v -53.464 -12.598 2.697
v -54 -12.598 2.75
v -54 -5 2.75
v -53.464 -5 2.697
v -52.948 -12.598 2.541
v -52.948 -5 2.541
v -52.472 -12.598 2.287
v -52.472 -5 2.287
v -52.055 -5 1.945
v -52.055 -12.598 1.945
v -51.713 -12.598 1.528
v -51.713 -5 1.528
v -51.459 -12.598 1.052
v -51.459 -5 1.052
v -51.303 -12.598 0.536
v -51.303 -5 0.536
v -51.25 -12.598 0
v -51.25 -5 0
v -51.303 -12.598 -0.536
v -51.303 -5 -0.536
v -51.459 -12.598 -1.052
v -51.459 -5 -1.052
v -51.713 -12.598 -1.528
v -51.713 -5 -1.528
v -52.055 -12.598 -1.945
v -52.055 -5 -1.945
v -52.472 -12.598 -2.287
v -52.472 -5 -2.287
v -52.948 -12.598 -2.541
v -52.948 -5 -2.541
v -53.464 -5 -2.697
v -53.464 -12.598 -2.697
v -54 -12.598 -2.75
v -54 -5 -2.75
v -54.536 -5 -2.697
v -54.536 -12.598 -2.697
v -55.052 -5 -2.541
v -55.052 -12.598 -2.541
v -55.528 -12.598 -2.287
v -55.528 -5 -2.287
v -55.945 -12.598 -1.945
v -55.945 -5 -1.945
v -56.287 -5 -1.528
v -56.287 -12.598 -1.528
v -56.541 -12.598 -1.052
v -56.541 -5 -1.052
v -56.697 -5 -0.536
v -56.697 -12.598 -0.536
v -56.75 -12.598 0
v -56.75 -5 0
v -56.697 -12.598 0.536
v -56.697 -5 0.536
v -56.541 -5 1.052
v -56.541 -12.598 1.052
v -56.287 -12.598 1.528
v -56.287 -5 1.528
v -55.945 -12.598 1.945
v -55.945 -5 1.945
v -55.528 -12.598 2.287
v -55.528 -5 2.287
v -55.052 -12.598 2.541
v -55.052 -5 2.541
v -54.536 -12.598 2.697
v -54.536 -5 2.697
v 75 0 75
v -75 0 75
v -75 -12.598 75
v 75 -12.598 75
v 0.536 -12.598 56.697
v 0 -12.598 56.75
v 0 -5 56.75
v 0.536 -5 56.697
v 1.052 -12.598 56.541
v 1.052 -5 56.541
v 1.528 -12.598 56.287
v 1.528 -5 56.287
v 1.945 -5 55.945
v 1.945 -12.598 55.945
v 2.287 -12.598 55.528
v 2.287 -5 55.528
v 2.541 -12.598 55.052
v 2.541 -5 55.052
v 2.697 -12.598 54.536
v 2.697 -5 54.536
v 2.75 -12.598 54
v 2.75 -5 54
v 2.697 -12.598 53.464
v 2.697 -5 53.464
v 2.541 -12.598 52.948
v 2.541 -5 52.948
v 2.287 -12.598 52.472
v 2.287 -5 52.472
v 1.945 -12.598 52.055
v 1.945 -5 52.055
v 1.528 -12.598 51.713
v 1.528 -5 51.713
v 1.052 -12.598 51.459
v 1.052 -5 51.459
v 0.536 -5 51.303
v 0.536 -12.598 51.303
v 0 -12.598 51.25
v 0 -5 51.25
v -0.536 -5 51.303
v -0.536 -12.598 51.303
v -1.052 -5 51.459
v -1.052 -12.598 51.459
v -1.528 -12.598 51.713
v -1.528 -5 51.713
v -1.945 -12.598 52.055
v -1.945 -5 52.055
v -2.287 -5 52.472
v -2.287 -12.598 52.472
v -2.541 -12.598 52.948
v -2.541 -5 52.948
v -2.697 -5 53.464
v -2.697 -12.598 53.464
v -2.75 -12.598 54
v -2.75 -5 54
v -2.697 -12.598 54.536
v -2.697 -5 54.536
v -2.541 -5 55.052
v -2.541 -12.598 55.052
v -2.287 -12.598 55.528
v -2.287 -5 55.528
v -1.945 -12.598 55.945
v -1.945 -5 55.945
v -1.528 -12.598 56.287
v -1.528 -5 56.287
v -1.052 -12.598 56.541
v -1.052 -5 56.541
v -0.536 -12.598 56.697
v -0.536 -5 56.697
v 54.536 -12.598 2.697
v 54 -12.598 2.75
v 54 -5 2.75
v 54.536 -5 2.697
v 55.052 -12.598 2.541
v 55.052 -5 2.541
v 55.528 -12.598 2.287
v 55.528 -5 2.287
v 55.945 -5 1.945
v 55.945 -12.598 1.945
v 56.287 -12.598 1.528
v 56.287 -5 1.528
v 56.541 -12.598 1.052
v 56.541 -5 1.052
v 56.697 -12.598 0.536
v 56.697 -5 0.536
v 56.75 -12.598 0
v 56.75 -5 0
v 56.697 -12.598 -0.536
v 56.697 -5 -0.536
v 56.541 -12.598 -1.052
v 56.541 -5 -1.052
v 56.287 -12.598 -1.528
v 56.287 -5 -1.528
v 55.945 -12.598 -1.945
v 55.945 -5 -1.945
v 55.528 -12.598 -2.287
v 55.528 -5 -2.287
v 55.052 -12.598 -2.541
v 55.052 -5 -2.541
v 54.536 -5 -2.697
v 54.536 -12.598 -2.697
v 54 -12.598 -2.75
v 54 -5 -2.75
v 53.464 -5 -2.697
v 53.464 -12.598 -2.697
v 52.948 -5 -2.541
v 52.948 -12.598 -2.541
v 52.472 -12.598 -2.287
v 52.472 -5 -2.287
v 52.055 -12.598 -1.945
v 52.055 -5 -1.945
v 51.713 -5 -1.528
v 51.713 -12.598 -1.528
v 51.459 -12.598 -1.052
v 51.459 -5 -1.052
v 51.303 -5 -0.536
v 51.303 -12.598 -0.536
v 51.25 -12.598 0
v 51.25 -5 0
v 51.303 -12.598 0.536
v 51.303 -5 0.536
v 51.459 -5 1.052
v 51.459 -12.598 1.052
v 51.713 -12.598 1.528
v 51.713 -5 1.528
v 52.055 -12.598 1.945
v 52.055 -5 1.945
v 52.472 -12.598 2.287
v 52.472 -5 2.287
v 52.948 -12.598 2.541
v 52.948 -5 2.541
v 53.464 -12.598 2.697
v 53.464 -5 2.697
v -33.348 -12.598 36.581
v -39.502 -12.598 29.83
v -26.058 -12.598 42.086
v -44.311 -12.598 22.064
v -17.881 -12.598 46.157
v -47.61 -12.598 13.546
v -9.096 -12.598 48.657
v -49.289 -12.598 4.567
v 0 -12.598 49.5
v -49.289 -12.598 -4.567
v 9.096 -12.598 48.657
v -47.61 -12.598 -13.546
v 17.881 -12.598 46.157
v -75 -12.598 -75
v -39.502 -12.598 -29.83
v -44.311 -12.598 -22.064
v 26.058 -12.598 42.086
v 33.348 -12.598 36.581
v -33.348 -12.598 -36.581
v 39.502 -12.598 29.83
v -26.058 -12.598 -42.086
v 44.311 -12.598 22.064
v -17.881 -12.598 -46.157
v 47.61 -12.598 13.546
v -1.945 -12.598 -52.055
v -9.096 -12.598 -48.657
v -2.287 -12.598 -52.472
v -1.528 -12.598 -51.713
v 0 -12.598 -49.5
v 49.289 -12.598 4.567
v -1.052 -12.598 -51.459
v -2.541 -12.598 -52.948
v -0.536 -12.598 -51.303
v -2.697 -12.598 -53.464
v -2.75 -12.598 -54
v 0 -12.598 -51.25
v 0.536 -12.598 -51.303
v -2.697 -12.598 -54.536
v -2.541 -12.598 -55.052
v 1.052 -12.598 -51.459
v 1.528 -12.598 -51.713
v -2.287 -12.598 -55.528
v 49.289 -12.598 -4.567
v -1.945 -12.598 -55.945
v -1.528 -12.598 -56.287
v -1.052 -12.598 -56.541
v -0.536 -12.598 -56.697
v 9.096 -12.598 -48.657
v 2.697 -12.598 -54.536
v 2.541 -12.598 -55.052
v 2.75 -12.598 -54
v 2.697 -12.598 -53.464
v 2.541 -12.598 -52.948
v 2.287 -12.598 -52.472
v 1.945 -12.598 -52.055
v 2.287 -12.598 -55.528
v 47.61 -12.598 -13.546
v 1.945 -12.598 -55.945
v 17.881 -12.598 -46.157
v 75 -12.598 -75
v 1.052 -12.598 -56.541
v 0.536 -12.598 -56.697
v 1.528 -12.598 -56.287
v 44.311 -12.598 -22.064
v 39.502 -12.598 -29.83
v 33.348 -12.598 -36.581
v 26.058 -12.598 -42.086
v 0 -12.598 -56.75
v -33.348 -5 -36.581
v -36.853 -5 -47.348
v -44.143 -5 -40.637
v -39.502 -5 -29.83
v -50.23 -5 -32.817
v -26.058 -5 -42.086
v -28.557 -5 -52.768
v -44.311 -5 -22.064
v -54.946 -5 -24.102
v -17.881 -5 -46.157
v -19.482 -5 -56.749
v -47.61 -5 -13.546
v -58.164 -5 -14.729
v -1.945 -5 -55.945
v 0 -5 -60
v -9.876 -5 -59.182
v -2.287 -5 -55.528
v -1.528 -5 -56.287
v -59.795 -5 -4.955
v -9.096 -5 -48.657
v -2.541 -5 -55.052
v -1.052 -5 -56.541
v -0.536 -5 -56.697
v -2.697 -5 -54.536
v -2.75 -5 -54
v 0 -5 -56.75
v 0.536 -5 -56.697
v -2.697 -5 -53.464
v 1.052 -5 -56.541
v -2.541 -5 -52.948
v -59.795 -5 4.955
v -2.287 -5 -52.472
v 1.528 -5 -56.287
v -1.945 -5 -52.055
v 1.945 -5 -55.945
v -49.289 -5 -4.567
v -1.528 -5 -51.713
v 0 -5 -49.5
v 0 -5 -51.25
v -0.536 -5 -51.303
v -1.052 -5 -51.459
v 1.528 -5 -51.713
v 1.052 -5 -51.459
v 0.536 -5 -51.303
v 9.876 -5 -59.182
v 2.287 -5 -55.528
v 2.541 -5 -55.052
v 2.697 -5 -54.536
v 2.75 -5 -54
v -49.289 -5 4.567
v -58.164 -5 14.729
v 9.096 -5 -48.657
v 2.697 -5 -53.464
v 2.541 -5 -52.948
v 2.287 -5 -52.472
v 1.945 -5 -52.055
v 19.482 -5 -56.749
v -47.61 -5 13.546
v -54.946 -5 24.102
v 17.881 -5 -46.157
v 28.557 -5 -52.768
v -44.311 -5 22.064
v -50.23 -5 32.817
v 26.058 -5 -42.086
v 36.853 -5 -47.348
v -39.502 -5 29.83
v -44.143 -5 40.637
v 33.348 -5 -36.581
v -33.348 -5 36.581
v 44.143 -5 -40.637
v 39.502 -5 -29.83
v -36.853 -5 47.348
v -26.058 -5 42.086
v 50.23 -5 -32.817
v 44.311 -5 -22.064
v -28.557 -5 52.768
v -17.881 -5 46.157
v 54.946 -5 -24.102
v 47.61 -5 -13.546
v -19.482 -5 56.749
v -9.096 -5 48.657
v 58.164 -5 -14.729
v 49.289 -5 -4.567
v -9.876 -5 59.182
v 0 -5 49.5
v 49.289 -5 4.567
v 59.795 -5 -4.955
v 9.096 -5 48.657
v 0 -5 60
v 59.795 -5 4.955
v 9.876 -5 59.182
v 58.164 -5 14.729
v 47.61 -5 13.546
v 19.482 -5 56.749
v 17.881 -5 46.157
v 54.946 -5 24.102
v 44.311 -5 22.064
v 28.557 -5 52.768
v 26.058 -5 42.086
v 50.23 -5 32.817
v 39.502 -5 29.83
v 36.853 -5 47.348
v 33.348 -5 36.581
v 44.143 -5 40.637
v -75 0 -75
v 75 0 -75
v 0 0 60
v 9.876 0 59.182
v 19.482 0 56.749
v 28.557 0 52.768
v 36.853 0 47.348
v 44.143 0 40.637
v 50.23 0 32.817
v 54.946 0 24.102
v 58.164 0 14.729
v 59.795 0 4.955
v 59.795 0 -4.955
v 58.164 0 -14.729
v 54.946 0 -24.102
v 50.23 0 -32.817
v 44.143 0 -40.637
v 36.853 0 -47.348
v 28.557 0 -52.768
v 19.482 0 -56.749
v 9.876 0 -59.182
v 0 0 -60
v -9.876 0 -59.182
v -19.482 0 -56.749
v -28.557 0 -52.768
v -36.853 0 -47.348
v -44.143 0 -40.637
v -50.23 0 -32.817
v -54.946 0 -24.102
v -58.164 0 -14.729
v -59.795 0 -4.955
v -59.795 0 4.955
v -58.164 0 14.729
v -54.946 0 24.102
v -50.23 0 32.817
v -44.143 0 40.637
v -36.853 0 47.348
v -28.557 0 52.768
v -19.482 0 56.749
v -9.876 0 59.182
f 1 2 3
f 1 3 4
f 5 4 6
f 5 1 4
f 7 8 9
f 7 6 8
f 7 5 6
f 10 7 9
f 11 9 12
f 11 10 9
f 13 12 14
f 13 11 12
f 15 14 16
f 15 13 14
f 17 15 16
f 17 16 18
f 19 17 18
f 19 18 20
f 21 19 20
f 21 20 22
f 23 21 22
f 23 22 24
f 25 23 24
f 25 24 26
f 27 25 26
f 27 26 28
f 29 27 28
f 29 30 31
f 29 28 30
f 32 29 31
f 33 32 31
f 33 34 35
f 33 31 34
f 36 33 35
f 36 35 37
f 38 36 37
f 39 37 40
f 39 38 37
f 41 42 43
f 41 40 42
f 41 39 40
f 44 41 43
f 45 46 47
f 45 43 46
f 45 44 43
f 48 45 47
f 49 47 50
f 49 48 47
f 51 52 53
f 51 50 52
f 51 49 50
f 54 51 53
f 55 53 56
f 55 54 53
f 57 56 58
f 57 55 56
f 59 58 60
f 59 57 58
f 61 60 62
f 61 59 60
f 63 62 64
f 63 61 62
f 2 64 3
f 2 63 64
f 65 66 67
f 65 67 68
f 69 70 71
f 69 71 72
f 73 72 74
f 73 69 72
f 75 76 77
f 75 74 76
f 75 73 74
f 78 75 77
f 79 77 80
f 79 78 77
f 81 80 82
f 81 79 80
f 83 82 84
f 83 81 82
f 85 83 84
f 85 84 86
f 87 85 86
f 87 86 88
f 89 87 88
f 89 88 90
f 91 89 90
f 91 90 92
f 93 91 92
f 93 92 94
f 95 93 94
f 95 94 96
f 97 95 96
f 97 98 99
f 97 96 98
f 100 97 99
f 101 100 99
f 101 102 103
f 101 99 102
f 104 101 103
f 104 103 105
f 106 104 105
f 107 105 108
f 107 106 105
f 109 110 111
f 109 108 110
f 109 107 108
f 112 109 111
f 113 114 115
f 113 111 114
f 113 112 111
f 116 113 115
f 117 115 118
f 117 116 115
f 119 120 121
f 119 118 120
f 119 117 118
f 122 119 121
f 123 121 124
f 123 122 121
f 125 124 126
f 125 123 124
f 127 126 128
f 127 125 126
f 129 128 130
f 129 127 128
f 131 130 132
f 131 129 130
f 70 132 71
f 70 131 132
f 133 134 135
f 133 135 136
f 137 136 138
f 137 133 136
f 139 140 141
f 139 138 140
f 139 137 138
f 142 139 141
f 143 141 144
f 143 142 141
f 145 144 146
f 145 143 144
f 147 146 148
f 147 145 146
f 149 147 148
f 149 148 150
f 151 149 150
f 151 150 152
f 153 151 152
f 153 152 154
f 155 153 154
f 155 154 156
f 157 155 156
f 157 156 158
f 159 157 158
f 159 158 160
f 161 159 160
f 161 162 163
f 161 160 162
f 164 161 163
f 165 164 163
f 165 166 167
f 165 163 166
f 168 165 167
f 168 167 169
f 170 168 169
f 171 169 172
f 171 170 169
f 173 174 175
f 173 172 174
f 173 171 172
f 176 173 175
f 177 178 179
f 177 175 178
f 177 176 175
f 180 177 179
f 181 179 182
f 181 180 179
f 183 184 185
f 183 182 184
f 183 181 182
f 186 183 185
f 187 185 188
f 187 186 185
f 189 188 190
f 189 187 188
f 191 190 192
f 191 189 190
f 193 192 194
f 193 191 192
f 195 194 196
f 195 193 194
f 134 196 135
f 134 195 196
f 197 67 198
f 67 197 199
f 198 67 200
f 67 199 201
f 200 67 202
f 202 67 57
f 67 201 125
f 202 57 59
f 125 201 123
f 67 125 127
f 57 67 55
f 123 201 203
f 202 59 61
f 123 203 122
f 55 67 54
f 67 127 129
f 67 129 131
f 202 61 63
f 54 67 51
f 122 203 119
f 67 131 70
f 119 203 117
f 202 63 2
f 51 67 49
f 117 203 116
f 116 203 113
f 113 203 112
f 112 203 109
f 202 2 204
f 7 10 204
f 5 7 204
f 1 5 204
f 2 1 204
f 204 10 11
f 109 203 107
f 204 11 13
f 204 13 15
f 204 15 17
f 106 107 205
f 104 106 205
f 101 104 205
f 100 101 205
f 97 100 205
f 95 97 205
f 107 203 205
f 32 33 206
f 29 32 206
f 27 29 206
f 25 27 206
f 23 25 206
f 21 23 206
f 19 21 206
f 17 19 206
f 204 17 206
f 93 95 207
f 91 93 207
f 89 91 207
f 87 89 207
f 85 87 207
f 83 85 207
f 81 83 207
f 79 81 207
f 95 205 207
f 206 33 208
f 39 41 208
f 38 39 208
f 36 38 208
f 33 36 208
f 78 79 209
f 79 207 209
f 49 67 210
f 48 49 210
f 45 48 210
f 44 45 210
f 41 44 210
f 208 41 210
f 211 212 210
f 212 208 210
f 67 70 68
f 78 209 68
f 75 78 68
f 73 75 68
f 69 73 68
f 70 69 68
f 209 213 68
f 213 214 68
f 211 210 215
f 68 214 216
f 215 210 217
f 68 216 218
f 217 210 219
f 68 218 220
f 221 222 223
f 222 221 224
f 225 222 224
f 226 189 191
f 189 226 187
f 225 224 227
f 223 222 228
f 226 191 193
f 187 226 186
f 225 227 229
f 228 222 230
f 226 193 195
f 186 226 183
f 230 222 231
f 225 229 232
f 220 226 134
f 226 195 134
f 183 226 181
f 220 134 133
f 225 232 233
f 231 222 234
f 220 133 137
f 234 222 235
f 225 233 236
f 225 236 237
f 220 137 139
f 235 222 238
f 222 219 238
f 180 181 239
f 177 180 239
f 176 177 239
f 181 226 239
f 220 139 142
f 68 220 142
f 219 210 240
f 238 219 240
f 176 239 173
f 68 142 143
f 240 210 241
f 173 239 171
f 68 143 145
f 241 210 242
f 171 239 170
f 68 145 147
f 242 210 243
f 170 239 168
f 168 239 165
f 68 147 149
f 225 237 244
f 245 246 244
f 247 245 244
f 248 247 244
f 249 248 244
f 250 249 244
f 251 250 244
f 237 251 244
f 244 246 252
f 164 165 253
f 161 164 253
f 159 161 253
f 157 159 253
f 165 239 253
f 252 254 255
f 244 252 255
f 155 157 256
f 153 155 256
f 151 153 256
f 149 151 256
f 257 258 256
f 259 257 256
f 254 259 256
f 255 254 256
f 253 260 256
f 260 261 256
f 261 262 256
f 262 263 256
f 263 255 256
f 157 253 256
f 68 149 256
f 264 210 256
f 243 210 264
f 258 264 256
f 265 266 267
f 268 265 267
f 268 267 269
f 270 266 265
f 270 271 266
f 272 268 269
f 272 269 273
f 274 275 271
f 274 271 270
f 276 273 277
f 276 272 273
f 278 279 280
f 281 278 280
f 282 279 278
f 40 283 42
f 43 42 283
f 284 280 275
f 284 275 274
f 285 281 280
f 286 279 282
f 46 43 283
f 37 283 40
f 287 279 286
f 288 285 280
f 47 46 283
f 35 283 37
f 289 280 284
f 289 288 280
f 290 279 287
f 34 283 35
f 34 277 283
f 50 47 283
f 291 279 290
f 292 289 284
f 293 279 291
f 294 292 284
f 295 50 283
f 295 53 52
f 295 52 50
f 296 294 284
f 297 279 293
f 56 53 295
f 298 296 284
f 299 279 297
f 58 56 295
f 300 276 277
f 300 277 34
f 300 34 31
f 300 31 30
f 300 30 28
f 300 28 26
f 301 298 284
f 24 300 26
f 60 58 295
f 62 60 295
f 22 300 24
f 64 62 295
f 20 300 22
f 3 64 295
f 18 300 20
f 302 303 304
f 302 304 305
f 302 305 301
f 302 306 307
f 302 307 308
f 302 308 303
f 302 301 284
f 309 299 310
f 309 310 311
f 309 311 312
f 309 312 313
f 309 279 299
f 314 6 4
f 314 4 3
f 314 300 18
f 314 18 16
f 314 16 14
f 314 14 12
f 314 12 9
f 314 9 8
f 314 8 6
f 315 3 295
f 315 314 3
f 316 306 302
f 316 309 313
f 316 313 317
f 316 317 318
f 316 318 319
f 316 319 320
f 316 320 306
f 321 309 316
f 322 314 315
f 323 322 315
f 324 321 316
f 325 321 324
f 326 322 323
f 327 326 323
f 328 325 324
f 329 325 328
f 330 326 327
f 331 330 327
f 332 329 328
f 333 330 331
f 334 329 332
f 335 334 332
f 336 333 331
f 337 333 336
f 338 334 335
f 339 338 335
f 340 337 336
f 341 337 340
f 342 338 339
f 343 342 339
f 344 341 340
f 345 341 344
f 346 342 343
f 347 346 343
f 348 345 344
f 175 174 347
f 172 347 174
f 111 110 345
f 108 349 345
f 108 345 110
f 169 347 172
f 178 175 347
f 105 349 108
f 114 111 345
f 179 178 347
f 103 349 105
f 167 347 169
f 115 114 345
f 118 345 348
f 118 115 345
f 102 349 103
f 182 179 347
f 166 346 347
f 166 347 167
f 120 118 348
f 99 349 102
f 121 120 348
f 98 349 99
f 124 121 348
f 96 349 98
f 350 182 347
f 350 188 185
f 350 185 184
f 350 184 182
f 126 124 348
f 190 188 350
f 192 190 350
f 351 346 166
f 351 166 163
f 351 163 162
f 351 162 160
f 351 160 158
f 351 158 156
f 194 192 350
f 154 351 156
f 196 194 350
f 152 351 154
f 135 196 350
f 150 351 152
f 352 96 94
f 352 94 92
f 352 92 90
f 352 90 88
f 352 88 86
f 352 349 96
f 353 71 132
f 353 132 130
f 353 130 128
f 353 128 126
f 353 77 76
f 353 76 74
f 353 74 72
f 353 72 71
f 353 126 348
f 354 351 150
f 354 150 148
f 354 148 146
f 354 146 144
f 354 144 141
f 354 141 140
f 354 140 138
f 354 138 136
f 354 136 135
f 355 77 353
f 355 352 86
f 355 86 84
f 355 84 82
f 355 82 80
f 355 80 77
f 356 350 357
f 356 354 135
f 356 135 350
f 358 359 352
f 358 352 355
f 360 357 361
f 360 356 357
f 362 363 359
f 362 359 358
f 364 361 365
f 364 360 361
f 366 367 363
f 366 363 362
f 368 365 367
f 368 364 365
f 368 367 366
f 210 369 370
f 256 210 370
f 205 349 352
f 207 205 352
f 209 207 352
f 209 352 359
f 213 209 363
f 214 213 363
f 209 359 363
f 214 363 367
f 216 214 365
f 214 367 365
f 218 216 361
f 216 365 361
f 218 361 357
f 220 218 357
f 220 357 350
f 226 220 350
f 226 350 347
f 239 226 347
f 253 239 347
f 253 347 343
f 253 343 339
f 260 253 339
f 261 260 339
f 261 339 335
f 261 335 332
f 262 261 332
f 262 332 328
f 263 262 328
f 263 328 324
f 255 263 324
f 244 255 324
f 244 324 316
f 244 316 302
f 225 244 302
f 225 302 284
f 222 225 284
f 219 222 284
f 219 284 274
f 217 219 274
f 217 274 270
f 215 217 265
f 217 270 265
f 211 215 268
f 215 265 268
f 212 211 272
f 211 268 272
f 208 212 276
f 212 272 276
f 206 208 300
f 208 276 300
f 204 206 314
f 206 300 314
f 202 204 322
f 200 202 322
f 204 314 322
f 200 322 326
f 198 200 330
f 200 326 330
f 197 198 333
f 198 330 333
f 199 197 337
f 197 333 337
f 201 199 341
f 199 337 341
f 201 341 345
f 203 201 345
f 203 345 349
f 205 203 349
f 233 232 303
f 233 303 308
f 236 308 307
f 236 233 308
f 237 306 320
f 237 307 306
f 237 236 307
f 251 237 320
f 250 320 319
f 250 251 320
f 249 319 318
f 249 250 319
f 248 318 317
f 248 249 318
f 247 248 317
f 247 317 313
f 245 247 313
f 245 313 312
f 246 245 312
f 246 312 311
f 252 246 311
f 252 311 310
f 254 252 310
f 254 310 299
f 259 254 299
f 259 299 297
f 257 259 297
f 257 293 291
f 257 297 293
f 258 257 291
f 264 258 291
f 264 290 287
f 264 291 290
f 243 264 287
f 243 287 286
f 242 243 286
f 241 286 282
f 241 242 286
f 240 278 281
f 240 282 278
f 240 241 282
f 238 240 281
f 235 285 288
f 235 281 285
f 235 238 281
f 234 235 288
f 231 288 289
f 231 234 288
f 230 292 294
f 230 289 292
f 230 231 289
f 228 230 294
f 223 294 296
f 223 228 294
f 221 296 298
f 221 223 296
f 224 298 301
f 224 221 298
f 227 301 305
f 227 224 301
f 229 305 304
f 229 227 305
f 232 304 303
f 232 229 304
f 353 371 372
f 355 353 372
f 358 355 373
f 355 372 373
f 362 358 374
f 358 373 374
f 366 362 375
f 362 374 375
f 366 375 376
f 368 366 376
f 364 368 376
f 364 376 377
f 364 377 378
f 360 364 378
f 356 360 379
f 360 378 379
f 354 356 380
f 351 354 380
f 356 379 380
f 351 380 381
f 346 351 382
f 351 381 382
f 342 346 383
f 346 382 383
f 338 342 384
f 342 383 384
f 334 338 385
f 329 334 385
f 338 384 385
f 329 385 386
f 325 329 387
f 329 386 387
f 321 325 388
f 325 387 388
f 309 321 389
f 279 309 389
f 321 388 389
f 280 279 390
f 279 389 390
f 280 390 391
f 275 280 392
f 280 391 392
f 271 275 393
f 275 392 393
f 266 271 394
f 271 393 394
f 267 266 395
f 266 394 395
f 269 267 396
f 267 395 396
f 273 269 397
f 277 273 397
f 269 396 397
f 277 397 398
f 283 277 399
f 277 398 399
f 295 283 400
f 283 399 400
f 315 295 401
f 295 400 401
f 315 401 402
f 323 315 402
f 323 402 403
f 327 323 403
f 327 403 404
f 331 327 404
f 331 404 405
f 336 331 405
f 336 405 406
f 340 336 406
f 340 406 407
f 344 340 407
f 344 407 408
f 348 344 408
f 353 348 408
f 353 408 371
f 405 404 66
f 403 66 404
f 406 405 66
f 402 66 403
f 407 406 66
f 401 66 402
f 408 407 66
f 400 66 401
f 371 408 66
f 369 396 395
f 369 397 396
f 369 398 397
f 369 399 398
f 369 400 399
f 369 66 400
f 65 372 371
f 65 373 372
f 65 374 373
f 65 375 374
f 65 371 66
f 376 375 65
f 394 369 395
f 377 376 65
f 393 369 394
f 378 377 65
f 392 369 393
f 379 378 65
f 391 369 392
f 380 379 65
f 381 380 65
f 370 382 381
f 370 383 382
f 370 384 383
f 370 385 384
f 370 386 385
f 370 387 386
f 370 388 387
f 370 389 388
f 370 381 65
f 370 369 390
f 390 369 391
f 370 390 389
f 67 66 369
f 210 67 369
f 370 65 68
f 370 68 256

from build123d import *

# Parameters (mm, degrees)
SKETCH1_W               = 150
SKETCH1_H               = 150
SKETCH1_R               = 49.5
BOSS_EXTRUDE1_DEPTH     = 12.5984
SKETCH2_R               = 60
CUT_EXTRUDE1_DEPTH      = 5
CUT_EXTRUDE2_DEPTH      = 107.81160837
CUT_EXTRUDE2_DEPTH_BACK = 107.81160837
SKETCH3_R               = 2.75


with BuildPart() as part:
    # Sketch1 → Boss-Extrude1 (new body)
    with BuildSketch(Plane(origin=(0, 0, 0), x_dir=(1, 0, 0), z_dir=(0, 1, 0))):
        Rectangle(SKETCH1_W, SKETCH1_H)
        with Locations(Location((0, 0, 0), (0, 0, 270))):
            Circle(SKETCH1_R, mode=Mode.SUBTRACT)
    extrude(amount=-BOSS_EXTRUDE1_DEPTH)

    # Sketch2 → Cut-Extrude1 (cut)
    with BuildSketch(Plane(origin=(0, 0, 0), x_dir=(1, 0, 0), z_dir=(0, 1, 0))):
        with Locations(Location((0, 0, 0), (0, 0, 270))):
            Circle(SKETCH2_R)
    extrude(amount=-CUT_EXTRUDE1_DEPTH, mode=Mode.SUBTRACT)

    # Sketch3 → Cut-Extrude2 (cut, two sides: drawn at the far end of the back side and taken through both)
    with BuildSketch(Plane(origin=(0, 0, 0), x_dir=(1, 0, 0), z_dir=(0, 1, 0)).offset(-CUT_EXTRUDE2_DEPTH_BACK)):
        with Locations(Location((-54, 0, 0), (0, 0, 270))):
            Circle(SKETCH3_R)
        with Locations(Location((0, 54, 0), (0, 0, 270))):
            Circle(SKETCH3_R)
        with Locations(Location((54, 0, 0), (0, 0, 270))):
            Circle(SKETCH3_R)
        with Locations(Location((0, -54, 0), (0, 0, 270))):
            Circle(SKETCH3_R)
    extrude(amount=CUT_EXTRUDE2_DEPTH + CUT_EXTRUDE2_DEPTH_BACK, mode=Mode.SUBTRACT)


solid = part.part
